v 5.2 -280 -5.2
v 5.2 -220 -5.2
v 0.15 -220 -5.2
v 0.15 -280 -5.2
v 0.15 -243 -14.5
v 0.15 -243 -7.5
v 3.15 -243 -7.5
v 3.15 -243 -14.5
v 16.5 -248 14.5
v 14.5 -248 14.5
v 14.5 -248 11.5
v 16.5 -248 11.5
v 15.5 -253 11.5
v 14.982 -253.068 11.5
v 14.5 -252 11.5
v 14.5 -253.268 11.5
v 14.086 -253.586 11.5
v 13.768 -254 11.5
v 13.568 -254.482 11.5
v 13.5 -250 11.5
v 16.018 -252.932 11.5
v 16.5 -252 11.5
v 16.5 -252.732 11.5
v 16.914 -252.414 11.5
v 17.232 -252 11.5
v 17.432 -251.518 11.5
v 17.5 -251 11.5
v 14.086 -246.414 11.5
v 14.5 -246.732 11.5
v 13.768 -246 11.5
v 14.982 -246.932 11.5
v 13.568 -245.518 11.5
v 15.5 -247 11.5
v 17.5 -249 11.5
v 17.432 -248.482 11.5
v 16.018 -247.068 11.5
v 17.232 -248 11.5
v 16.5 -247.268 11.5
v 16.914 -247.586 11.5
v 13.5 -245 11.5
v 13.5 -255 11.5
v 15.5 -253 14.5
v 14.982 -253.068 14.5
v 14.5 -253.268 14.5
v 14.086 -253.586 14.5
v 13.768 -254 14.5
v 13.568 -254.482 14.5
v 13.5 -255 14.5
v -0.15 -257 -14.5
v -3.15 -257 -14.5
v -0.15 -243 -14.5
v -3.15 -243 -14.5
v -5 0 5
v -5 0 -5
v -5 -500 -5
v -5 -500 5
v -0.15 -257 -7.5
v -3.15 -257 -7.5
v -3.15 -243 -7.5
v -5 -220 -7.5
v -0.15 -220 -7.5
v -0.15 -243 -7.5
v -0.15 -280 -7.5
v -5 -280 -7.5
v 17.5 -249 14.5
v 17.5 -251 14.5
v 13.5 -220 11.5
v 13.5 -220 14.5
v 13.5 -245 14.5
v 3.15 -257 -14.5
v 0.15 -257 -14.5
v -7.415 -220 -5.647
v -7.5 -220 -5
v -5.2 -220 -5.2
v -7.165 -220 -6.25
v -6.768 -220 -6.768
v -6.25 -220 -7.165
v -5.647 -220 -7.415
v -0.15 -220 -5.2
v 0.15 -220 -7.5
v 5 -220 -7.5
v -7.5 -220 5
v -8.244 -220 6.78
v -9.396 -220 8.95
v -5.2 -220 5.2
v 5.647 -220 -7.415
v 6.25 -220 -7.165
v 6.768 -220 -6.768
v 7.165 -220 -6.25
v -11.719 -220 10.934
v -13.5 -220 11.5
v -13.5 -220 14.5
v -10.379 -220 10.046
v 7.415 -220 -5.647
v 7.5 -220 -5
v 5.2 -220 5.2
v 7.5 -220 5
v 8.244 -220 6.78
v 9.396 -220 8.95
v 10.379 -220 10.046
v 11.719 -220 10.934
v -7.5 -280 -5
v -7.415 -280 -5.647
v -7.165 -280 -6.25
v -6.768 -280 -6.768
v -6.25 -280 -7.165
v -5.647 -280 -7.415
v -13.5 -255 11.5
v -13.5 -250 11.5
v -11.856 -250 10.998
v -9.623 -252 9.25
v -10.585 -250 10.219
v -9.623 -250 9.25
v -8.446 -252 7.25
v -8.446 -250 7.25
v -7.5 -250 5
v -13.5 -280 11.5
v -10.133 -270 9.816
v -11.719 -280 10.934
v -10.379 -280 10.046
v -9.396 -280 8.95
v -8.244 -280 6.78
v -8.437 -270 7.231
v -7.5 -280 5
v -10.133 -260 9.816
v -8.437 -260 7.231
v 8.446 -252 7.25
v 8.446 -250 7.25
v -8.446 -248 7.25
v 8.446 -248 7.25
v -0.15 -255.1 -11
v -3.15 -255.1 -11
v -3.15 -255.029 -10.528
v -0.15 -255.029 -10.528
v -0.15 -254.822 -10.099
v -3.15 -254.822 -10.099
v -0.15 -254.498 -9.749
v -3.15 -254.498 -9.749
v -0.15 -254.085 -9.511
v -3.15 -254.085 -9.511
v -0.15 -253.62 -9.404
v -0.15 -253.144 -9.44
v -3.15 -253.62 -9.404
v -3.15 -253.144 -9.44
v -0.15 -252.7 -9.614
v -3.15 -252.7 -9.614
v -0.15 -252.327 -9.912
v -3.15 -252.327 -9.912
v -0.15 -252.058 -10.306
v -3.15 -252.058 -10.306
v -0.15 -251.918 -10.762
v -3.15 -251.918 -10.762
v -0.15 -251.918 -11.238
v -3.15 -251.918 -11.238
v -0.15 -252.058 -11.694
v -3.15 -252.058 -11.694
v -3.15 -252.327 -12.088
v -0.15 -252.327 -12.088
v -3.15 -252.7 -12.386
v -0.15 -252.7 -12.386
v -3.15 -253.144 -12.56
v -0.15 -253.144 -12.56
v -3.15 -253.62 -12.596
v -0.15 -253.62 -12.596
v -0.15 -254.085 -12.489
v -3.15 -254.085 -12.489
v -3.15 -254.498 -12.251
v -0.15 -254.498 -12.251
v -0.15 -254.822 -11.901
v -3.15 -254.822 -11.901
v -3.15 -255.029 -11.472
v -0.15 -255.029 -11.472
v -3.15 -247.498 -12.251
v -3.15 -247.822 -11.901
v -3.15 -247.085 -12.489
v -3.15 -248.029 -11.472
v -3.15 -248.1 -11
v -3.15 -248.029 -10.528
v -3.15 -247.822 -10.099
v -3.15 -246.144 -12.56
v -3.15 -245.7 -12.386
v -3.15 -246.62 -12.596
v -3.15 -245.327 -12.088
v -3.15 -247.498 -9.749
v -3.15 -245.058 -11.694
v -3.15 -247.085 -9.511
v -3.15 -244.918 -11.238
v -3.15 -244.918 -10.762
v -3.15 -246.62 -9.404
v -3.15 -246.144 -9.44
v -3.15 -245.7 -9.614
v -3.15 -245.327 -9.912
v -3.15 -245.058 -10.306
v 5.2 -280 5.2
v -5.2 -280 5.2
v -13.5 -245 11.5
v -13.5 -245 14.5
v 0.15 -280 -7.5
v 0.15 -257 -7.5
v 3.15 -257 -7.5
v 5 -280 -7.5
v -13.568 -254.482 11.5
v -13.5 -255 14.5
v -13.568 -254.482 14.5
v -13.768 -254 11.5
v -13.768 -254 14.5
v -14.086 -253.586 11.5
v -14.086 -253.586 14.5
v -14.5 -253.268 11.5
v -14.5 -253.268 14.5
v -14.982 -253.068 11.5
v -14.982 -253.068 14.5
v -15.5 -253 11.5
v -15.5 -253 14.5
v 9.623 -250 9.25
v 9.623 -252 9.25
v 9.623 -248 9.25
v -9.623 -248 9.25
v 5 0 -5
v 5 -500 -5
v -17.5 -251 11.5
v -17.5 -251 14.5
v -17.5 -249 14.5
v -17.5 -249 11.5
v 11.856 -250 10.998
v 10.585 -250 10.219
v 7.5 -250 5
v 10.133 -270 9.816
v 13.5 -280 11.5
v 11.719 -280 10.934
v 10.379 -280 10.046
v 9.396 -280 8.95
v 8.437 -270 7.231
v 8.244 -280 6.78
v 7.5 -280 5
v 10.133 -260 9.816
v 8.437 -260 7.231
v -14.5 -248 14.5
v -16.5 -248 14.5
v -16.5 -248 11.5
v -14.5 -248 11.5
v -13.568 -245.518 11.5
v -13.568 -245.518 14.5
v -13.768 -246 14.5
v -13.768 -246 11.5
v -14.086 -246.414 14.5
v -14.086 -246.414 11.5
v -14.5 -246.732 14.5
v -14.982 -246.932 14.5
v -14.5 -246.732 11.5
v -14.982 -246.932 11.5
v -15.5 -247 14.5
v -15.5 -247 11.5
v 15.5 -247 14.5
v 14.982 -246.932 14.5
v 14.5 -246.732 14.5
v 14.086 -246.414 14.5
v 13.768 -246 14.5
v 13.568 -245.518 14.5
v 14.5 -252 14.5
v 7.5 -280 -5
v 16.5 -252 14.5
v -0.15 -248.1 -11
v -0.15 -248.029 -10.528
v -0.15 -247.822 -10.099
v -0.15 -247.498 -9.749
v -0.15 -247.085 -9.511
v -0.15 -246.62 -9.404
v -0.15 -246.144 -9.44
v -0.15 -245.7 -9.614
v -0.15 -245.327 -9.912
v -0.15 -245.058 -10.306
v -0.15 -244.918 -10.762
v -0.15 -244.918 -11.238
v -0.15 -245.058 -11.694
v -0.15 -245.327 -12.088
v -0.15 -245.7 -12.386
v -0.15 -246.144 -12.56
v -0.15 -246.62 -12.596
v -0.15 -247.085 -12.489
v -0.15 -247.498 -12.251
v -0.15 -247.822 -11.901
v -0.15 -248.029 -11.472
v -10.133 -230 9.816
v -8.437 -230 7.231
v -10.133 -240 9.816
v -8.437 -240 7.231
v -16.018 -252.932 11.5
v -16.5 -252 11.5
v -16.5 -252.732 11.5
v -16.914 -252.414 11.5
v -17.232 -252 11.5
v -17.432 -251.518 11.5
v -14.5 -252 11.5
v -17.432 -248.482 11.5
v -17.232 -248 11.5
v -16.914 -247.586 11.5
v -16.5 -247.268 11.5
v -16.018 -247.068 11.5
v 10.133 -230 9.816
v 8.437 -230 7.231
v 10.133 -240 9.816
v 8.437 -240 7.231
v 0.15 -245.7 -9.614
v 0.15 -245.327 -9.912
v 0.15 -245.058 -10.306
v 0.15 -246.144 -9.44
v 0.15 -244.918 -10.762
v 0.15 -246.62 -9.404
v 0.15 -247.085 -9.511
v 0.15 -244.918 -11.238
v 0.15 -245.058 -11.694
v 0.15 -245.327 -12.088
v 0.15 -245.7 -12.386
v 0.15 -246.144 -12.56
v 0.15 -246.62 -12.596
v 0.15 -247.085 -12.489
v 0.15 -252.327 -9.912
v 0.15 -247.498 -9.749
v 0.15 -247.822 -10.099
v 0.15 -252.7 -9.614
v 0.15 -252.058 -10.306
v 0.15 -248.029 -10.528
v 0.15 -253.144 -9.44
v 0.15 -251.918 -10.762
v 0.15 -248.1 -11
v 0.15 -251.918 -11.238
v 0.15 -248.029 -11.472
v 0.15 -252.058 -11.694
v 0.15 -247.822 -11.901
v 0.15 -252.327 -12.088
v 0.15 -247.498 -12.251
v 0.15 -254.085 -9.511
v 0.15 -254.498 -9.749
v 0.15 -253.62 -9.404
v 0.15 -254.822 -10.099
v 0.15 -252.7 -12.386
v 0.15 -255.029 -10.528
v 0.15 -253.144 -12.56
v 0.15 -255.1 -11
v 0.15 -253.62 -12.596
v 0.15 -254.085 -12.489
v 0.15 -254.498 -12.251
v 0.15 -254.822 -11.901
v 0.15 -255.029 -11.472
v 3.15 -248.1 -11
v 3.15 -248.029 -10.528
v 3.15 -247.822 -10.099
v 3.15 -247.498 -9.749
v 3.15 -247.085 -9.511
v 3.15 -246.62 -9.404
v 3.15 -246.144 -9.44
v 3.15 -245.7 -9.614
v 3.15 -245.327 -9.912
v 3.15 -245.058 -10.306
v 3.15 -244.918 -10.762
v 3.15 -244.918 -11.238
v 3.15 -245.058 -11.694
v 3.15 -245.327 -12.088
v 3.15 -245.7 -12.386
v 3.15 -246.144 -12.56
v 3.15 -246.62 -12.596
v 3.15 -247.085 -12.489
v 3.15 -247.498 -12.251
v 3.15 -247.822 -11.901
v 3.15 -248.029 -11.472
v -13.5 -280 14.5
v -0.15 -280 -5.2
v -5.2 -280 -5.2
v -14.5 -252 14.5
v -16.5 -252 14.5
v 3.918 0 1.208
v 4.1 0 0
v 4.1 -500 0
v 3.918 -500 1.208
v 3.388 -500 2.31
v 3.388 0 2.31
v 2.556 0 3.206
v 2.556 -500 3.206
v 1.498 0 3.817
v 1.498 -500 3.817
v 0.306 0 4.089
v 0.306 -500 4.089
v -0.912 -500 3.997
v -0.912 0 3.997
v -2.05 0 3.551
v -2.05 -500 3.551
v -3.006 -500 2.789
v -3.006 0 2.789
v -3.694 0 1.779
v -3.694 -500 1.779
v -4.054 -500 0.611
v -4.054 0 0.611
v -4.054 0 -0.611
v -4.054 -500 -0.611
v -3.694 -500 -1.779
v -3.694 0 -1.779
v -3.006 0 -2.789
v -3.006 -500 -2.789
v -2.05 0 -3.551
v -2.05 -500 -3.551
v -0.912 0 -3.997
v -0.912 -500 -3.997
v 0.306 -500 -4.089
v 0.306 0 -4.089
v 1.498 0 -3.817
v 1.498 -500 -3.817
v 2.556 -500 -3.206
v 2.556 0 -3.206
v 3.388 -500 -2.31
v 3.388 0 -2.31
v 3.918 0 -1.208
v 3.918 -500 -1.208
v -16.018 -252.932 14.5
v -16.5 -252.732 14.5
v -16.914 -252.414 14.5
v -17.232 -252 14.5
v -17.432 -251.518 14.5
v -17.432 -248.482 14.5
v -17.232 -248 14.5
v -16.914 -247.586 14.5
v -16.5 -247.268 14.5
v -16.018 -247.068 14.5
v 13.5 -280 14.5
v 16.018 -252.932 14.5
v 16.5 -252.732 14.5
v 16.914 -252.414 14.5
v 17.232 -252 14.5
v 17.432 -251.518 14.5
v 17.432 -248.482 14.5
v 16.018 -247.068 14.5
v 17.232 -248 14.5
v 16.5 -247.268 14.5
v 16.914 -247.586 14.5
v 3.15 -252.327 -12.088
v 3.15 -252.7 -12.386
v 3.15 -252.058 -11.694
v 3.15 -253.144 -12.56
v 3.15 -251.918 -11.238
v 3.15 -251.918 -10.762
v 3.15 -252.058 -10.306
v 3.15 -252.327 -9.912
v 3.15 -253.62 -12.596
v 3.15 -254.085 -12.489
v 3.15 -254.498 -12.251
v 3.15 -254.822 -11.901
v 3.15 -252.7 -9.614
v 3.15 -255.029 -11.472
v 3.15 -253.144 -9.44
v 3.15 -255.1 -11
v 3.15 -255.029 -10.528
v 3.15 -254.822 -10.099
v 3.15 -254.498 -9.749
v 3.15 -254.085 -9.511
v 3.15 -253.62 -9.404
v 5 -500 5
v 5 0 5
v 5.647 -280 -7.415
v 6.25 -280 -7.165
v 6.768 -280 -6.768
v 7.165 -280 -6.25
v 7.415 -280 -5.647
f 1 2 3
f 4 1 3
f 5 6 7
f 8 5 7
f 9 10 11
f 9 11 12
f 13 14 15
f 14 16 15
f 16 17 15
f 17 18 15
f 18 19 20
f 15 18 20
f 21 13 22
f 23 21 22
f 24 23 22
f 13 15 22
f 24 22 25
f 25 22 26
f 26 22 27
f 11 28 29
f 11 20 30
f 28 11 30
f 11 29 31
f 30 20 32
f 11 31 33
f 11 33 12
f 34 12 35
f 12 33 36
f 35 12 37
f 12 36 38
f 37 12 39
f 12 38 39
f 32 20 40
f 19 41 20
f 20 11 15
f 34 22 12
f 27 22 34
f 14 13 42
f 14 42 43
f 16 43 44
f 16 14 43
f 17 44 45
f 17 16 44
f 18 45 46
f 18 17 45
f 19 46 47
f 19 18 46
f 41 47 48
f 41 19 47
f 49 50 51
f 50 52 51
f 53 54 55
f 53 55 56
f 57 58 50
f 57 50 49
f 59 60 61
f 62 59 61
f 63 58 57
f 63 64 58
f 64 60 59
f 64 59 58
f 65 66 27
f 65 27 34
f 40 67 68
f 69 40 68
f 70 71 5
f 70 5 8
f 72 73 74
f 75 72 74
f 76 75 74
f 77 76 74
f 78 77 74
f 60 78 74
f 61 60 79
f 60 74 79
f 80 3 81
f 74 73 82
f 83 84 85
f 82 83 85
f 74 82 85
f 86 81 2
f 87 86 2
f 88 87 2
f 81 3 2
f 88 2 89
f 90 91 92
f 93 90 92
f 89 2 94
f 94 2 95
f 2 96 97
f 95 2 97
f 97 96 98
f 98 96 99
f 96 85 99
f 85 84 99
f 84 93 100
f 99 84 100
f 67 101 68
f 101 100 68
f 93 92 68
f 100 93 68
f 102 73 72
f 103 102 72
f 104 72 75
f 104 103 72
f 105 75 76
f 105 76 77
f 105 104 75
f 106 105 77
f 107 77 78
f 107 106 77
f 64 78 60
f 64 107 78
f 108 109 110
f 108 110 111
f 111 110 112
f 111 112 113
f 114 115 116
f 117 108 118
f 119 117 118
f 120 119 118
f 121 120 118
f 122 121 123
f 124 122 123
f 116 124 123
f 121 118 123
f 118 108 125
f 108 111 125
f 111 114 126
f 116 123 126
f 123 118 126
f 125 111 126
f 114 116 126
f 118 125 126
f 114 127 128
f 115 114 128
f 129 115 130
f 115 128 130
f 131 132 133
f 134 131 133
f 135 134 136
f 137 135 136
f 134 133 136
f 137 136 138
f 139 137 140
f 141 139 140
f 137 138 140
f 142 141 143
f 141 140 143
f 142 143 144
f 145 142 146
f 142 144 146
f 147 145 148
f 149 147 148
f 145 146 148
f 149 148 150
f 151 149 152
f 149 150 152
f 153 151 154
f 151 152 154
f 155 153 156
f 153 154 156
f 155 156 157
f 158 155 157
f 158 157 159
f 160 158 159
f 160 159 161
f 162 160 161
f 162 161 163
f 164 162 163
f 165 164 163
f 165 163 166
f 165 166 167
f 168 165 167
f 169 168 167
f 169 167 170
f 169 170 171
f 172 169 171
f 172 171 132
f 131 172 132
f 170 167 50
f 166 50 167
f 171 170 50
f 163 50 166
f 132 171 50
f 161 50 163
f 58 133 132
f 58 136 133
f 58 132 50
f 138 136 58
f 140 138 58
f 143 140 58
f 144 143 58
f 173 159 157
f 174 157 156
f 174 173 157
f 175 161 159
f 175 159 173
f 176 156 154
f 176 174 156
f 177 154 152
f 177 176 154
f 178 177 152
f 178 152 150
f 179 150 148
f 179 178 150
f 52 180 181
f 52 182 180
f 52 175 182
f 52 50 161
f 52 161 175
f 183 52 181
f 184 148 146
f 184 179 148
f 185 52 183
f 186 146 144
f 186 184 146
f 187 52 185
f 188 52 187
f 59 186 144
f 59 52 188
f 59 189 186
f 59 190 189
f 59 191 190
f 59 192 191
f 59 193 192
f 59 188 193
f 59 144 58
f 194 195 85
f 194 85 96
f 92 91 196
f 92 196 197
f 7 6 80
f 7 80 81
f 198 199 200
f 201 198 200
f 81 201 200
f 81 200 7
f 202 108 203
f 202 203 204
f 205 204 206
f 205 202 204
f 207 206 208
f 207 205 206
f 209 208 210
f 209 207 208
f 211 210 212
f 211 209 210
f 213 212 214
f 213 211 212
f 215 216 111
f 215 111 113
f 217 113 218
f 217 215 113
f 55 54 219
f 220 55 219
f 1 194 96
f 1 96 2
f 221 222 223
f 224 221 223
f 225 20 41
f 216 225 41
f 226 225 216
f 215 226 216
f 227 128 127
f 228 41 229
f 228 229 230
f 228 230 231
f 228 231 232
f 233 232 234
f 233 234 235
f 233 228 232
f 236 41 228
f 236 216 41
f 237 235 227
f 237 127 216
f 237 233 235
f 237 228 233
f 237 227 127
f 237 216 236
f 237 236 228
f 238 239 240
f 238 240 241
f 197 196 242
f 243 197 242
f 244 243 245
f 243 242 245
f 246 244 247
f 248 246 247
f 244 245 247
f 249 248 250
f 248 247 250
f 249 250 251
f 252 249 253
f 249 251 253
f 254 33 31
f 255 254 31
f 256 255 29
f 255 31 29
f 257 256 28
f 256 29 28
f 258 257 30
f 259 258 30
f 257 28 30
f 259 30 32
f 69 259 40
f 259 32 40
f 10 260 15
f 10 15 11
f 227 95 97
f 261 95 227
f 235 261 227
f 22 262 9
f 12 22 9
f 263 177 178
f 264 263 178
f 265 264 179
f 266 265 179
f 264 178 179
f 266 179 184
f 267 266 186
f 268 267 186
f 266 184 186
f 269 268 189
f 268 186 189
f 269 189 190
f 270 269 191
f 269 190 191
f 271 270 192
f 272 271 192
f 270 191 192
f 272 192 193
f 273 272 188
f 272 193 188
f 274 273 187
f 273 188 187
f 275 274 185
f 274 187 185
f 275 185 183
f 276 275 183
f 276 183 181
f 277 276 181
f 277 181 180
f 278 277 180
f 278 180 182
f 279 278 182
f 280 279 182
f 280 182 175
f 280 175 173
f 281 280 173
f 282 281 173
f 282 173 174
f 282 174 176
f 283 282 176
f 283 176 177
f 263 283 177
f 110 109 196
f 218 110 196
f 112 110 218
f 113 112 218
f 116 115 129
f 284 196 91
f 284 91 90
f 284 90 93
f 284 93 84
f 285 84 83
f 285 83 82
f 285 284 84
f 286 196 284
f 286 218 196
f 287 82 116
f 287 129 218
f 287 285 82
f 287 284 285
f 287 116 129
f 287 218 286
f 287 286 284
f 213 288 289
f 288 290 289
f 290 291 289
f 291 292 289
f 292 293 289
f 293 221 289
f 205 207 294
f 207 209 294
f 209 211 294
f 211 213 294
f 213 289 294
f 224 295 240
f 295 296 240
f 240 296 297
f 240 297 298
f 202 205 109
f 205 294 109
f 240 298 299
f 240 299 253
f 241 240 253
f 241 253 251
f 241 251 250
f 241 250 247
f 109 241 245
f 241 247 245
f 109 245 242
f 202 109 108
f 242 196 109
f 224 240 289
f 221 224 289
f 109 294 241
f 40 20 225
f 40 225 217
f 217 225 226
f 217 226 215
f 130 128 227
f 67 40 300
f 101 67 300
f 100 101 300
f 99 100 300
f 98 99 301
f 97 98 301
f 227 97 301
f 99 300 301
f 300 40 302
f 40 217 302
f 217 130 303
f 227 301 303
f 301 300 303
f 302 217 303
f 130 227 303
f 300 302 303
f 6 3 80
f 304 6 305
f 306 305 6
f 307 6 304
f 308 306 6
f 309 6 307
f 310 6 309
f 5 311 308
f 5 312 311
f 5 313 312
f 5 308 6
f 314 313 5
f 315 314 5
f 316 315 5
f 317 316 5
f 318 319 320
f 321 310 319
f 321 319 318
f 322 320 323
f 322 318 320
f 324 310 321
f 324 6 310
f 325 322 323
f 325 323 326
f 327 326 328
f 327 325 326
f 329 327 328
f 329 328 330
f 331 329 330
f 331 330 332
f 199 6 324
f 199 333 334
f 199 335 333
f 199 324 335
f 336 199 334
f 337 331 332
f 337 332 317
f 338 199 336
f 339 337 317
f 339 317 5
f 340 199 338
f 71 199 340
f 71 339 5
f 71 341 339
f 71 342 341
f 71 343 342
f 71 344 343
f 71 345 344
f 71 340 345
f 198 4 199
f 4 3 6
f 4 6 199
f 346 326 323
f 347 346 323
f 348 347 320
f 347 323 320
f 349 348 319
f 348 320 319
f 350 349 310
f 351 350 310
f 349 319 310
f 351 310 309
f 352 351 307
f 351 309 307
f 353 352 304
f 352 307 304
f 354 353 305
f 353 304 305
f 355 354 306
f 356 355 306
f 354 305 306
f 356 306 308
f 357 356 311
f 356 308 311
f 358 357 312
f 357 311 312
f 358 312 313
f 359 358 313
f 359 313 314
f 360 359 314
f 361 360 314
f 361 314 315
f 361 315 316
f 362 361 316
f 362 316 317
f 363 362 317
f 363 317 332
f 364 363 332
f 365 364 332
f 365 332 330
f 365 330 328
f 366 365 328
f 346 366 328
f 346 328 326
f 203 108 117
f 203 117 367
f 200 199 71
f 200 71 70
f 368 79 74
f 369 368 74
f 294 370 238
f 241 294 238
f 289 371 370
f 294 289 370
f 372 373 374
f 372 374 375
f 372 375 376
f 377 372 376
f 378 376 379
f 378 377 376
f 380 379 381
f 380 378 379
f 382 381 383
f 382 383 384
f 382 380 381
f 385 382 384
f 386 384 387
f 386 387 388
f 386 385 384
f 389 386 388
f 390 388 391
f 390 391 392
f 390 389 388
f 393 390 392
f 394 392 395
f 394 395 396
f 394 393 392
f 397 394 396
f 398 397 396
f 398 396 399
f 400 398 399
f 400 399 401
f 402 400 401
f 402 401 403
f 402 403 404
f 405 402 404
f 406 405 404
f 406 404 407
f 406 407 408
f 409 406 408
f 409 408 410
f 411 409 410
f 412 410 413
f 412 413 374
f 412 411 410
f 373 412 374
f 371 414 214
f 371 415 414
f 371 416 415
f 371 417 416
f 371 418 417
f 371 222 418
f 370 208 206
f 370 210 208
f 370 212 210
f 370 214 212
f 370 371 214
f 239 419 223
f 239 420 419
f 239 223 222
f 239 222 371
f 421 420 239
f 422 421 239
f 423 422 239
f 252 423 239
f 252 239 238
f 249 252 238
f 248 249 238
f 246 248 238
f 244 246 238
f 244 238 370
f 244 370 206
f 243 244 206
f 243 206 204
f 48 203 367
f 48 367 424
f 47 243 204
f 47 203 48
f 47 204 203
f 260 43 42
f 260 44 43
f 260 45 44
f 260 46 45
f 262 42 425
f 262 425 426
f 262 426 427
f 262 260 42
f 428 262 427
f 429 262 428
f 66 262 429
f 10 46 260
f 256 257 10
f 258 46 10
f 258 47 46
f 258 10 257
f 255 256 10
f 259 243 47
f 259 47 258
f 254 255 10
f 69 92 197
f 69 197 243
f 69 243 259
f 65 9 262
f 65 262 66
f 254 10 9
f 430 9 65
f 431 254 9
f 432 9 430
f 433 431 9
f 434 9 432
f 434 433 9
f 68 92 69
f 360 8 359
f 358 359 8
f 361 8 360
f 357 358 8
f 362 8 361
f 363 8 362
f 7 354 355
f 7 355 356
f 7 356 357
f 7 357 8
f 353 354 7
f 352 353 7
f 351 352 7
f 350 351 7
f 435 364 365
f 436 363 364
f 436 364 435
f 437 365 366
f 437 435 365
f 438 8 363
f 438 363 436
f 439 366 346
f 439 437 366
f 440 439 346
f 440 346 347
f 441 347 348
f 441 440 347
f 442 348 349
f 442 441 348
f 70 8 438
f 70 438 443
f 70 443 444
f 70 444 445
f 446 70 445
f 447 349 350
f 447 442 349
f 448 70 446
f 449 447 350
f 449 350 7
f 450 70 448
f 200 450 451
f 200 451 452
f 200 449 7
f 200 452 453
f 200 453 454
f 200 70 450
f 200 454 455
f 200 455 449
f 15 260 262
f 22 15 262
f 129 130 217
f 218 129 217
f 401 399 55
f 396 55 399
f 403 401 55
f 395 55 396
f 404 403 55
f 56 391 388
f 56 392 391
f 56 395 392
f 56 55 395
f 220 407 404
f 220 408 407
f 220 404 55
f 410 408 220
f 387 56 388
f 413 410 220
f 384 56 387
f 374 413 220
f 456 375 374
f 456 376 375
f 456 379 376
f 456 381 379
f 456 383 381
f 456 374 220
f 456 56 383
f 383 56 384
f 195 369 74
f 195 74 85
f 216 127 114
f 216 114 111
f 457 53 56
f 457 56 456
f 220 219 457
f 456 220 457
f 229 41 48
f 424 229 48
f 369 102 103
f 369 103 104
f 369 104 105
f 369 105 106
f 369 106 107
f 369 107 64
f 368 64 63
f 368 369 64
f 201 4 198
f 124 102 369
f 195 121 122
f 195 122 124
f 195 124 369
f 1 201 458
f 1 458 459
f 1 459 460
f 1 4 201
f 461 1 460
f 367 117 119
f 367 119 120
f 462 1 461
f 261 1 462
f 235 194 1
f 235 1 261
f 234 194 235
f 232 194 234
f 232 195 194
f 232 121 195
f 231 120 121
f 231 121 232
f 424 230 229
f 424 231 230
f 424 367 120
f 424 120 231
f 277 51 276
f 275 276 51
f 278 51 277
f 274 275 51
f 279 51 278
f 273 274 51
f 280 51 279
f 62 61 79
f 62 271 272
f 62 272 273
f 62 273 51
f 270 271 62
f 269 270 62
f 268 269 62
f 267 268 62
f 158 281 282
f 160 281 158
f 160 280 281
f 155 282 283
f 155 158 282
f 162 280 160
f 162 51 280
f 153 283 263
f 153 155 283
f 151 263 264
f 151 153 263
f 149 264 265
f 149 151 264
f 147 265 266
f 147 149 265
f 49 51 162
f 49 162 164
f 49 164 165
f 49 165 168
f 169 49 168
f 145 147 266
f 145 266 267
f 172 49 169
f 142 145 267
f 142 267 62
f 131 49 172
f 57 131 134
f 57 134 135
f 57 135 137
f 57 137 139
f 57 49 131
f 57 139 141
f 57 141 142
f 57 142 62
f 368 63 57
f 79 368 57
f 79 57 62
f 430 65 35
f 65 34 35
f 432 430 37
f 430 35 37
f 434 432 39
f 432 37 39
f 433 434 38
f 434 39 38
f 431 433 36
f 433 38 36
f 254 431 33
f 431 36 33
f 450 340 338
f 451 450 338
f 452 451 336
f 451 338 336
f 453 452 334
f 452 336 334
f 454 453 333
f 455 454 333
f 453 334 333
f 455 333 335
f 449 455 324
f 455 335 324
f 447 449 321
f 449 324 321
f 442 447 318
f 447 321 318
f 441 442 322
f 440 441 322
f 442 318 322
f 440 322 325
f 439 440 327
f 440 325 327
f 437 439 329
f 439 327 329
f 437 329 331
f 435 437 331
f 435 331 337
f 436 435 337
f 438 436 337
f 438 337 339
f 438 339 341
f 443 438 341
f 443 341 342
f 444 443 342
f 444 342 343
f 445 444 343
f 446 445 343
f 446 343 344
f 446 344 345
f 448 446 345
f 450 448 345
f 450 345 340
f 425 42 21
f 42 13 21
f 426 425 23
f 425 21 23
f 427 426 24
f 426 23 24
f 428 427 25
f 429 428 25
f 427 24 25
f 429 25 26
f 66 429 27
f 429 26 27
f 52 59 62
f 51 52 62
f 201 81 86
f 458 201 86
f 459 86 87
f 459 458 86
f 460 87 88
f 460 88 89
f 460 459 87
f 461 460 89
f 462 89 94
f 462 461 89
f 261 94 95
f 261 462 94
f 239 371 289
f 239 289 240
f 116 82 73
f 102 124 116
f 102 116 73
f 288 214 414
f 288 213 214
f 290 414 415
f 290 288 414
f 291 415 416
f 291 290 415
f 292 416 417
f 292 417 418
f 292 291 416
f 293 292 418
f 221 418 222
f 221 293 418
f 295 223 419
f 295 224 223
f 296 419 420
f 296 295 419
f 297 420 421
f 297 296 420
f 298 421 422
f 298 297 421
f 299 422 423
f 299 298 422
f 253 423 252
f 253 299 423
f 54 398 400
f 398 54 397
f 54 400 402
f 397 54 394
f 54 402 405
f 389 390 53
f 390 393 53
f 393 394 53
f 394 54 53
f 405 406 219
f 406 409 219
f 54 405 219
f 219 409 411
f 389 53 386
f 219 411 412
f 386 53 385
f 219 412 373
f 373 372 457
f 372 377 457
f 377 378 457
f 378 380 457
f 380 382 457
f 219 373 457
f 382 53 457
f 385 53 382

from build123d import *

# Parameters (mm, degrees)
F0_W      = 10
F0_H      = 10
F0_R      = 4.1
F1_DEPTH  = 500
F3_W      = 27
F3_H      = 3
F4_DEPTH  = 30
F3_W_2    = 3
F3_H_2    = 7
F5_DEPTH  = 7
F6_R      = 1.6
F7_DEPTH  = 25
F8_W      = 4
F8_H      = 6
F8_W_2    = 2
F8_H_2    = 4
F9_DEPTH  = 3
F10_R     = 1.99999
F11_W     = 4
F11_H     = 2
F12_DEPTH = 25


# Not quite as in the source:
# - a fillet or chamfer is up to 0.001 mm smaller than in the source, because OpenCascade refuses the exact size


with BuildPart() as f1:
    # F0 (on Front) → F1 (new body)
    with BuildSketch(Plane.XZ):
        Rectangle(F0_W, F0_H)
        Circle(F0_R, mode=Mode.SUBTRACT)
    extrude(amount=F1_DEPTH)


with BuildPart() as f4:
    # F3 (on offset) → F4 (new body, symmetric)
    with BuildSketch(Plane.XZ.offset(250)):
        with BuildLine():
            Line((5, 7.5), (-5, 7.5))
            ThreePointArc((-5, 7.5), (-6.767766953, 6.767766953), (-7.5, 5))
            Line((-7.5, 5), (-7.5, -5))
            ThreePointArc((-7.5, -5), (-6.767766953, -6.767766953), (-5, -7.5))
            Line((-5, -7.5), (-3.15, -7.5))
            Line((-3.15, -7.5), (-0.15, -7.5))
            Line((-0.15, -7.5), (-0.15, -5.2))
            Line((-0.15, -5.2), (-5.2, -5.2))
            Line((-5.2, -5.2), (-5.2, 5.2))
            Line((-5.2, 5.2), (5.2, 5.2))
            Line((5.2, 5.2), (5.2, -5.2))
            Line((5.2, -5.2), (0.15, -5.2))
            Line((0.15, -5.2), (0.15, -7.5))
            Line((0.15, -7.5), (3.15, -7.5))
            Line((3.15, -7.5), (5, -7.5))
            ThreePointArc((5, -7.5), (6.767766953, -6.767766953), (7.5, -5))
            Line((7.5, -5), (7.5, 5))
            ThreePointArc((7.5, 5), (6.767766953, 6.767766953), (5, 7.5))
        make_face()
        with Locations((0, 13)):
            Rectangle(F3_W, F3_H)
        with BuildLine():
            ThreePointArc((-7.5, 5), (-6.767766953, 6.767766953), (-5, 7.5))
            Line((-5, 7.5), (5, 7.5))
            ThreePointArc((5, 7.5), (6.767766953, 6.767766953), (7.5, 5))
            add(Edge.make_bspline(
                [(13.5, 11.5), (8.9917294681, 10.6846382581), (8.3630047739, 6.6367634572), (7.5, 5)],
                knots=[0, 0, 0, 0, 8.8459030065, 8.8459030065, 8.8459030065, 8.8459030065], degree=3))
            Line((13.5, 11.5), (-13.5, 11.5))
            add(Edge.make_bspline(
                [(-13.5, 11.5), (-8.9917294681, 10.6846382581), (-8.3630047739, 6.6367634572), (-7.5, 5)],
                knots=[0, 0, 0, 0, 8.8459030065, 8.8459030065, 8.8459030065, 8.8459030065], degree=3))
        make_face()
    extrude(amount=F4_DEPTH, both=True)

    # F3 (on offset) → F5 (join, symmetric)
    with BuildSketch(Plane.XZ.offset(250)):
        with Locations((-1.65, -11)):
            Rectangle(F3_W_2, F3_H_2)
        with Locations((1.65, -11)):
            Rectangle(F3_W_2, F3_H_2)
    extrude(amount=F5_DEPTH, both=True)

    # F6 (on face) → F7 (cut)
    with BuildSketch(Plane(origin=(-3.15, 0, 0), x_dir=(0, -1, 0), z_dir=(-1, 0, 0))):
        with Locations((246.5, -11)):
            Circle(F6_R)
        with Locations((253.5, -11)):
            Circle(F6_R)
    extrude(amount=-F7_DEPTH, mode=Mode.SUBTRACT)

    # F8 (on face) → F9 (join)
    with BuildSketch(Plane.XY.offset(14.5)):
        with Locations((15.5, -250)):
            Rectangle(F8_W, F8_H)
        with Locations((15.5, -250)):
            Rectangle(F8_W_2, F8_H_2, mode=Mode.SUBTRACT)
        with Locations((-15.5, -250)):
            Rectangle(F8_W, F8_H)
        with Locations((-15.5, -250)):
            Rectangle(F8_W_2, F8_H_2, mode=Mode.SUBTRACT)
    extrude(amount=-F9_DEPTH)

    # F10 (radius 2 in the source; OpenCascade refuses exactly that, so slightly less here)
    f10_edges = [f4.edges().sort_by_distance(p)[0] for p in [
        (-17.5, -247, 13),
        (-13.5, -247, 13),
        (-17.5, -253, 13),
        (-13.5, -253, 13),
        (17.5, -247, 13),
        (13.5, -247, 13),
        (13.5, -253, 13),
        (17.5, -253, 13),
    ]]
    fillet(f10_edges, radius=F10_R)

    # F11 (on face) → F12 (cut)
    with BuildSketch(Plane.YZ.offset(13.5)):
        with Locations((-250, 8.25)):
            Rectangle(F11_W, F11_H)
    extrude(amount=-F12_DEPTH, mode=Mode.SUBTRACT)


solid = Compound([f1.part, f4.part])
